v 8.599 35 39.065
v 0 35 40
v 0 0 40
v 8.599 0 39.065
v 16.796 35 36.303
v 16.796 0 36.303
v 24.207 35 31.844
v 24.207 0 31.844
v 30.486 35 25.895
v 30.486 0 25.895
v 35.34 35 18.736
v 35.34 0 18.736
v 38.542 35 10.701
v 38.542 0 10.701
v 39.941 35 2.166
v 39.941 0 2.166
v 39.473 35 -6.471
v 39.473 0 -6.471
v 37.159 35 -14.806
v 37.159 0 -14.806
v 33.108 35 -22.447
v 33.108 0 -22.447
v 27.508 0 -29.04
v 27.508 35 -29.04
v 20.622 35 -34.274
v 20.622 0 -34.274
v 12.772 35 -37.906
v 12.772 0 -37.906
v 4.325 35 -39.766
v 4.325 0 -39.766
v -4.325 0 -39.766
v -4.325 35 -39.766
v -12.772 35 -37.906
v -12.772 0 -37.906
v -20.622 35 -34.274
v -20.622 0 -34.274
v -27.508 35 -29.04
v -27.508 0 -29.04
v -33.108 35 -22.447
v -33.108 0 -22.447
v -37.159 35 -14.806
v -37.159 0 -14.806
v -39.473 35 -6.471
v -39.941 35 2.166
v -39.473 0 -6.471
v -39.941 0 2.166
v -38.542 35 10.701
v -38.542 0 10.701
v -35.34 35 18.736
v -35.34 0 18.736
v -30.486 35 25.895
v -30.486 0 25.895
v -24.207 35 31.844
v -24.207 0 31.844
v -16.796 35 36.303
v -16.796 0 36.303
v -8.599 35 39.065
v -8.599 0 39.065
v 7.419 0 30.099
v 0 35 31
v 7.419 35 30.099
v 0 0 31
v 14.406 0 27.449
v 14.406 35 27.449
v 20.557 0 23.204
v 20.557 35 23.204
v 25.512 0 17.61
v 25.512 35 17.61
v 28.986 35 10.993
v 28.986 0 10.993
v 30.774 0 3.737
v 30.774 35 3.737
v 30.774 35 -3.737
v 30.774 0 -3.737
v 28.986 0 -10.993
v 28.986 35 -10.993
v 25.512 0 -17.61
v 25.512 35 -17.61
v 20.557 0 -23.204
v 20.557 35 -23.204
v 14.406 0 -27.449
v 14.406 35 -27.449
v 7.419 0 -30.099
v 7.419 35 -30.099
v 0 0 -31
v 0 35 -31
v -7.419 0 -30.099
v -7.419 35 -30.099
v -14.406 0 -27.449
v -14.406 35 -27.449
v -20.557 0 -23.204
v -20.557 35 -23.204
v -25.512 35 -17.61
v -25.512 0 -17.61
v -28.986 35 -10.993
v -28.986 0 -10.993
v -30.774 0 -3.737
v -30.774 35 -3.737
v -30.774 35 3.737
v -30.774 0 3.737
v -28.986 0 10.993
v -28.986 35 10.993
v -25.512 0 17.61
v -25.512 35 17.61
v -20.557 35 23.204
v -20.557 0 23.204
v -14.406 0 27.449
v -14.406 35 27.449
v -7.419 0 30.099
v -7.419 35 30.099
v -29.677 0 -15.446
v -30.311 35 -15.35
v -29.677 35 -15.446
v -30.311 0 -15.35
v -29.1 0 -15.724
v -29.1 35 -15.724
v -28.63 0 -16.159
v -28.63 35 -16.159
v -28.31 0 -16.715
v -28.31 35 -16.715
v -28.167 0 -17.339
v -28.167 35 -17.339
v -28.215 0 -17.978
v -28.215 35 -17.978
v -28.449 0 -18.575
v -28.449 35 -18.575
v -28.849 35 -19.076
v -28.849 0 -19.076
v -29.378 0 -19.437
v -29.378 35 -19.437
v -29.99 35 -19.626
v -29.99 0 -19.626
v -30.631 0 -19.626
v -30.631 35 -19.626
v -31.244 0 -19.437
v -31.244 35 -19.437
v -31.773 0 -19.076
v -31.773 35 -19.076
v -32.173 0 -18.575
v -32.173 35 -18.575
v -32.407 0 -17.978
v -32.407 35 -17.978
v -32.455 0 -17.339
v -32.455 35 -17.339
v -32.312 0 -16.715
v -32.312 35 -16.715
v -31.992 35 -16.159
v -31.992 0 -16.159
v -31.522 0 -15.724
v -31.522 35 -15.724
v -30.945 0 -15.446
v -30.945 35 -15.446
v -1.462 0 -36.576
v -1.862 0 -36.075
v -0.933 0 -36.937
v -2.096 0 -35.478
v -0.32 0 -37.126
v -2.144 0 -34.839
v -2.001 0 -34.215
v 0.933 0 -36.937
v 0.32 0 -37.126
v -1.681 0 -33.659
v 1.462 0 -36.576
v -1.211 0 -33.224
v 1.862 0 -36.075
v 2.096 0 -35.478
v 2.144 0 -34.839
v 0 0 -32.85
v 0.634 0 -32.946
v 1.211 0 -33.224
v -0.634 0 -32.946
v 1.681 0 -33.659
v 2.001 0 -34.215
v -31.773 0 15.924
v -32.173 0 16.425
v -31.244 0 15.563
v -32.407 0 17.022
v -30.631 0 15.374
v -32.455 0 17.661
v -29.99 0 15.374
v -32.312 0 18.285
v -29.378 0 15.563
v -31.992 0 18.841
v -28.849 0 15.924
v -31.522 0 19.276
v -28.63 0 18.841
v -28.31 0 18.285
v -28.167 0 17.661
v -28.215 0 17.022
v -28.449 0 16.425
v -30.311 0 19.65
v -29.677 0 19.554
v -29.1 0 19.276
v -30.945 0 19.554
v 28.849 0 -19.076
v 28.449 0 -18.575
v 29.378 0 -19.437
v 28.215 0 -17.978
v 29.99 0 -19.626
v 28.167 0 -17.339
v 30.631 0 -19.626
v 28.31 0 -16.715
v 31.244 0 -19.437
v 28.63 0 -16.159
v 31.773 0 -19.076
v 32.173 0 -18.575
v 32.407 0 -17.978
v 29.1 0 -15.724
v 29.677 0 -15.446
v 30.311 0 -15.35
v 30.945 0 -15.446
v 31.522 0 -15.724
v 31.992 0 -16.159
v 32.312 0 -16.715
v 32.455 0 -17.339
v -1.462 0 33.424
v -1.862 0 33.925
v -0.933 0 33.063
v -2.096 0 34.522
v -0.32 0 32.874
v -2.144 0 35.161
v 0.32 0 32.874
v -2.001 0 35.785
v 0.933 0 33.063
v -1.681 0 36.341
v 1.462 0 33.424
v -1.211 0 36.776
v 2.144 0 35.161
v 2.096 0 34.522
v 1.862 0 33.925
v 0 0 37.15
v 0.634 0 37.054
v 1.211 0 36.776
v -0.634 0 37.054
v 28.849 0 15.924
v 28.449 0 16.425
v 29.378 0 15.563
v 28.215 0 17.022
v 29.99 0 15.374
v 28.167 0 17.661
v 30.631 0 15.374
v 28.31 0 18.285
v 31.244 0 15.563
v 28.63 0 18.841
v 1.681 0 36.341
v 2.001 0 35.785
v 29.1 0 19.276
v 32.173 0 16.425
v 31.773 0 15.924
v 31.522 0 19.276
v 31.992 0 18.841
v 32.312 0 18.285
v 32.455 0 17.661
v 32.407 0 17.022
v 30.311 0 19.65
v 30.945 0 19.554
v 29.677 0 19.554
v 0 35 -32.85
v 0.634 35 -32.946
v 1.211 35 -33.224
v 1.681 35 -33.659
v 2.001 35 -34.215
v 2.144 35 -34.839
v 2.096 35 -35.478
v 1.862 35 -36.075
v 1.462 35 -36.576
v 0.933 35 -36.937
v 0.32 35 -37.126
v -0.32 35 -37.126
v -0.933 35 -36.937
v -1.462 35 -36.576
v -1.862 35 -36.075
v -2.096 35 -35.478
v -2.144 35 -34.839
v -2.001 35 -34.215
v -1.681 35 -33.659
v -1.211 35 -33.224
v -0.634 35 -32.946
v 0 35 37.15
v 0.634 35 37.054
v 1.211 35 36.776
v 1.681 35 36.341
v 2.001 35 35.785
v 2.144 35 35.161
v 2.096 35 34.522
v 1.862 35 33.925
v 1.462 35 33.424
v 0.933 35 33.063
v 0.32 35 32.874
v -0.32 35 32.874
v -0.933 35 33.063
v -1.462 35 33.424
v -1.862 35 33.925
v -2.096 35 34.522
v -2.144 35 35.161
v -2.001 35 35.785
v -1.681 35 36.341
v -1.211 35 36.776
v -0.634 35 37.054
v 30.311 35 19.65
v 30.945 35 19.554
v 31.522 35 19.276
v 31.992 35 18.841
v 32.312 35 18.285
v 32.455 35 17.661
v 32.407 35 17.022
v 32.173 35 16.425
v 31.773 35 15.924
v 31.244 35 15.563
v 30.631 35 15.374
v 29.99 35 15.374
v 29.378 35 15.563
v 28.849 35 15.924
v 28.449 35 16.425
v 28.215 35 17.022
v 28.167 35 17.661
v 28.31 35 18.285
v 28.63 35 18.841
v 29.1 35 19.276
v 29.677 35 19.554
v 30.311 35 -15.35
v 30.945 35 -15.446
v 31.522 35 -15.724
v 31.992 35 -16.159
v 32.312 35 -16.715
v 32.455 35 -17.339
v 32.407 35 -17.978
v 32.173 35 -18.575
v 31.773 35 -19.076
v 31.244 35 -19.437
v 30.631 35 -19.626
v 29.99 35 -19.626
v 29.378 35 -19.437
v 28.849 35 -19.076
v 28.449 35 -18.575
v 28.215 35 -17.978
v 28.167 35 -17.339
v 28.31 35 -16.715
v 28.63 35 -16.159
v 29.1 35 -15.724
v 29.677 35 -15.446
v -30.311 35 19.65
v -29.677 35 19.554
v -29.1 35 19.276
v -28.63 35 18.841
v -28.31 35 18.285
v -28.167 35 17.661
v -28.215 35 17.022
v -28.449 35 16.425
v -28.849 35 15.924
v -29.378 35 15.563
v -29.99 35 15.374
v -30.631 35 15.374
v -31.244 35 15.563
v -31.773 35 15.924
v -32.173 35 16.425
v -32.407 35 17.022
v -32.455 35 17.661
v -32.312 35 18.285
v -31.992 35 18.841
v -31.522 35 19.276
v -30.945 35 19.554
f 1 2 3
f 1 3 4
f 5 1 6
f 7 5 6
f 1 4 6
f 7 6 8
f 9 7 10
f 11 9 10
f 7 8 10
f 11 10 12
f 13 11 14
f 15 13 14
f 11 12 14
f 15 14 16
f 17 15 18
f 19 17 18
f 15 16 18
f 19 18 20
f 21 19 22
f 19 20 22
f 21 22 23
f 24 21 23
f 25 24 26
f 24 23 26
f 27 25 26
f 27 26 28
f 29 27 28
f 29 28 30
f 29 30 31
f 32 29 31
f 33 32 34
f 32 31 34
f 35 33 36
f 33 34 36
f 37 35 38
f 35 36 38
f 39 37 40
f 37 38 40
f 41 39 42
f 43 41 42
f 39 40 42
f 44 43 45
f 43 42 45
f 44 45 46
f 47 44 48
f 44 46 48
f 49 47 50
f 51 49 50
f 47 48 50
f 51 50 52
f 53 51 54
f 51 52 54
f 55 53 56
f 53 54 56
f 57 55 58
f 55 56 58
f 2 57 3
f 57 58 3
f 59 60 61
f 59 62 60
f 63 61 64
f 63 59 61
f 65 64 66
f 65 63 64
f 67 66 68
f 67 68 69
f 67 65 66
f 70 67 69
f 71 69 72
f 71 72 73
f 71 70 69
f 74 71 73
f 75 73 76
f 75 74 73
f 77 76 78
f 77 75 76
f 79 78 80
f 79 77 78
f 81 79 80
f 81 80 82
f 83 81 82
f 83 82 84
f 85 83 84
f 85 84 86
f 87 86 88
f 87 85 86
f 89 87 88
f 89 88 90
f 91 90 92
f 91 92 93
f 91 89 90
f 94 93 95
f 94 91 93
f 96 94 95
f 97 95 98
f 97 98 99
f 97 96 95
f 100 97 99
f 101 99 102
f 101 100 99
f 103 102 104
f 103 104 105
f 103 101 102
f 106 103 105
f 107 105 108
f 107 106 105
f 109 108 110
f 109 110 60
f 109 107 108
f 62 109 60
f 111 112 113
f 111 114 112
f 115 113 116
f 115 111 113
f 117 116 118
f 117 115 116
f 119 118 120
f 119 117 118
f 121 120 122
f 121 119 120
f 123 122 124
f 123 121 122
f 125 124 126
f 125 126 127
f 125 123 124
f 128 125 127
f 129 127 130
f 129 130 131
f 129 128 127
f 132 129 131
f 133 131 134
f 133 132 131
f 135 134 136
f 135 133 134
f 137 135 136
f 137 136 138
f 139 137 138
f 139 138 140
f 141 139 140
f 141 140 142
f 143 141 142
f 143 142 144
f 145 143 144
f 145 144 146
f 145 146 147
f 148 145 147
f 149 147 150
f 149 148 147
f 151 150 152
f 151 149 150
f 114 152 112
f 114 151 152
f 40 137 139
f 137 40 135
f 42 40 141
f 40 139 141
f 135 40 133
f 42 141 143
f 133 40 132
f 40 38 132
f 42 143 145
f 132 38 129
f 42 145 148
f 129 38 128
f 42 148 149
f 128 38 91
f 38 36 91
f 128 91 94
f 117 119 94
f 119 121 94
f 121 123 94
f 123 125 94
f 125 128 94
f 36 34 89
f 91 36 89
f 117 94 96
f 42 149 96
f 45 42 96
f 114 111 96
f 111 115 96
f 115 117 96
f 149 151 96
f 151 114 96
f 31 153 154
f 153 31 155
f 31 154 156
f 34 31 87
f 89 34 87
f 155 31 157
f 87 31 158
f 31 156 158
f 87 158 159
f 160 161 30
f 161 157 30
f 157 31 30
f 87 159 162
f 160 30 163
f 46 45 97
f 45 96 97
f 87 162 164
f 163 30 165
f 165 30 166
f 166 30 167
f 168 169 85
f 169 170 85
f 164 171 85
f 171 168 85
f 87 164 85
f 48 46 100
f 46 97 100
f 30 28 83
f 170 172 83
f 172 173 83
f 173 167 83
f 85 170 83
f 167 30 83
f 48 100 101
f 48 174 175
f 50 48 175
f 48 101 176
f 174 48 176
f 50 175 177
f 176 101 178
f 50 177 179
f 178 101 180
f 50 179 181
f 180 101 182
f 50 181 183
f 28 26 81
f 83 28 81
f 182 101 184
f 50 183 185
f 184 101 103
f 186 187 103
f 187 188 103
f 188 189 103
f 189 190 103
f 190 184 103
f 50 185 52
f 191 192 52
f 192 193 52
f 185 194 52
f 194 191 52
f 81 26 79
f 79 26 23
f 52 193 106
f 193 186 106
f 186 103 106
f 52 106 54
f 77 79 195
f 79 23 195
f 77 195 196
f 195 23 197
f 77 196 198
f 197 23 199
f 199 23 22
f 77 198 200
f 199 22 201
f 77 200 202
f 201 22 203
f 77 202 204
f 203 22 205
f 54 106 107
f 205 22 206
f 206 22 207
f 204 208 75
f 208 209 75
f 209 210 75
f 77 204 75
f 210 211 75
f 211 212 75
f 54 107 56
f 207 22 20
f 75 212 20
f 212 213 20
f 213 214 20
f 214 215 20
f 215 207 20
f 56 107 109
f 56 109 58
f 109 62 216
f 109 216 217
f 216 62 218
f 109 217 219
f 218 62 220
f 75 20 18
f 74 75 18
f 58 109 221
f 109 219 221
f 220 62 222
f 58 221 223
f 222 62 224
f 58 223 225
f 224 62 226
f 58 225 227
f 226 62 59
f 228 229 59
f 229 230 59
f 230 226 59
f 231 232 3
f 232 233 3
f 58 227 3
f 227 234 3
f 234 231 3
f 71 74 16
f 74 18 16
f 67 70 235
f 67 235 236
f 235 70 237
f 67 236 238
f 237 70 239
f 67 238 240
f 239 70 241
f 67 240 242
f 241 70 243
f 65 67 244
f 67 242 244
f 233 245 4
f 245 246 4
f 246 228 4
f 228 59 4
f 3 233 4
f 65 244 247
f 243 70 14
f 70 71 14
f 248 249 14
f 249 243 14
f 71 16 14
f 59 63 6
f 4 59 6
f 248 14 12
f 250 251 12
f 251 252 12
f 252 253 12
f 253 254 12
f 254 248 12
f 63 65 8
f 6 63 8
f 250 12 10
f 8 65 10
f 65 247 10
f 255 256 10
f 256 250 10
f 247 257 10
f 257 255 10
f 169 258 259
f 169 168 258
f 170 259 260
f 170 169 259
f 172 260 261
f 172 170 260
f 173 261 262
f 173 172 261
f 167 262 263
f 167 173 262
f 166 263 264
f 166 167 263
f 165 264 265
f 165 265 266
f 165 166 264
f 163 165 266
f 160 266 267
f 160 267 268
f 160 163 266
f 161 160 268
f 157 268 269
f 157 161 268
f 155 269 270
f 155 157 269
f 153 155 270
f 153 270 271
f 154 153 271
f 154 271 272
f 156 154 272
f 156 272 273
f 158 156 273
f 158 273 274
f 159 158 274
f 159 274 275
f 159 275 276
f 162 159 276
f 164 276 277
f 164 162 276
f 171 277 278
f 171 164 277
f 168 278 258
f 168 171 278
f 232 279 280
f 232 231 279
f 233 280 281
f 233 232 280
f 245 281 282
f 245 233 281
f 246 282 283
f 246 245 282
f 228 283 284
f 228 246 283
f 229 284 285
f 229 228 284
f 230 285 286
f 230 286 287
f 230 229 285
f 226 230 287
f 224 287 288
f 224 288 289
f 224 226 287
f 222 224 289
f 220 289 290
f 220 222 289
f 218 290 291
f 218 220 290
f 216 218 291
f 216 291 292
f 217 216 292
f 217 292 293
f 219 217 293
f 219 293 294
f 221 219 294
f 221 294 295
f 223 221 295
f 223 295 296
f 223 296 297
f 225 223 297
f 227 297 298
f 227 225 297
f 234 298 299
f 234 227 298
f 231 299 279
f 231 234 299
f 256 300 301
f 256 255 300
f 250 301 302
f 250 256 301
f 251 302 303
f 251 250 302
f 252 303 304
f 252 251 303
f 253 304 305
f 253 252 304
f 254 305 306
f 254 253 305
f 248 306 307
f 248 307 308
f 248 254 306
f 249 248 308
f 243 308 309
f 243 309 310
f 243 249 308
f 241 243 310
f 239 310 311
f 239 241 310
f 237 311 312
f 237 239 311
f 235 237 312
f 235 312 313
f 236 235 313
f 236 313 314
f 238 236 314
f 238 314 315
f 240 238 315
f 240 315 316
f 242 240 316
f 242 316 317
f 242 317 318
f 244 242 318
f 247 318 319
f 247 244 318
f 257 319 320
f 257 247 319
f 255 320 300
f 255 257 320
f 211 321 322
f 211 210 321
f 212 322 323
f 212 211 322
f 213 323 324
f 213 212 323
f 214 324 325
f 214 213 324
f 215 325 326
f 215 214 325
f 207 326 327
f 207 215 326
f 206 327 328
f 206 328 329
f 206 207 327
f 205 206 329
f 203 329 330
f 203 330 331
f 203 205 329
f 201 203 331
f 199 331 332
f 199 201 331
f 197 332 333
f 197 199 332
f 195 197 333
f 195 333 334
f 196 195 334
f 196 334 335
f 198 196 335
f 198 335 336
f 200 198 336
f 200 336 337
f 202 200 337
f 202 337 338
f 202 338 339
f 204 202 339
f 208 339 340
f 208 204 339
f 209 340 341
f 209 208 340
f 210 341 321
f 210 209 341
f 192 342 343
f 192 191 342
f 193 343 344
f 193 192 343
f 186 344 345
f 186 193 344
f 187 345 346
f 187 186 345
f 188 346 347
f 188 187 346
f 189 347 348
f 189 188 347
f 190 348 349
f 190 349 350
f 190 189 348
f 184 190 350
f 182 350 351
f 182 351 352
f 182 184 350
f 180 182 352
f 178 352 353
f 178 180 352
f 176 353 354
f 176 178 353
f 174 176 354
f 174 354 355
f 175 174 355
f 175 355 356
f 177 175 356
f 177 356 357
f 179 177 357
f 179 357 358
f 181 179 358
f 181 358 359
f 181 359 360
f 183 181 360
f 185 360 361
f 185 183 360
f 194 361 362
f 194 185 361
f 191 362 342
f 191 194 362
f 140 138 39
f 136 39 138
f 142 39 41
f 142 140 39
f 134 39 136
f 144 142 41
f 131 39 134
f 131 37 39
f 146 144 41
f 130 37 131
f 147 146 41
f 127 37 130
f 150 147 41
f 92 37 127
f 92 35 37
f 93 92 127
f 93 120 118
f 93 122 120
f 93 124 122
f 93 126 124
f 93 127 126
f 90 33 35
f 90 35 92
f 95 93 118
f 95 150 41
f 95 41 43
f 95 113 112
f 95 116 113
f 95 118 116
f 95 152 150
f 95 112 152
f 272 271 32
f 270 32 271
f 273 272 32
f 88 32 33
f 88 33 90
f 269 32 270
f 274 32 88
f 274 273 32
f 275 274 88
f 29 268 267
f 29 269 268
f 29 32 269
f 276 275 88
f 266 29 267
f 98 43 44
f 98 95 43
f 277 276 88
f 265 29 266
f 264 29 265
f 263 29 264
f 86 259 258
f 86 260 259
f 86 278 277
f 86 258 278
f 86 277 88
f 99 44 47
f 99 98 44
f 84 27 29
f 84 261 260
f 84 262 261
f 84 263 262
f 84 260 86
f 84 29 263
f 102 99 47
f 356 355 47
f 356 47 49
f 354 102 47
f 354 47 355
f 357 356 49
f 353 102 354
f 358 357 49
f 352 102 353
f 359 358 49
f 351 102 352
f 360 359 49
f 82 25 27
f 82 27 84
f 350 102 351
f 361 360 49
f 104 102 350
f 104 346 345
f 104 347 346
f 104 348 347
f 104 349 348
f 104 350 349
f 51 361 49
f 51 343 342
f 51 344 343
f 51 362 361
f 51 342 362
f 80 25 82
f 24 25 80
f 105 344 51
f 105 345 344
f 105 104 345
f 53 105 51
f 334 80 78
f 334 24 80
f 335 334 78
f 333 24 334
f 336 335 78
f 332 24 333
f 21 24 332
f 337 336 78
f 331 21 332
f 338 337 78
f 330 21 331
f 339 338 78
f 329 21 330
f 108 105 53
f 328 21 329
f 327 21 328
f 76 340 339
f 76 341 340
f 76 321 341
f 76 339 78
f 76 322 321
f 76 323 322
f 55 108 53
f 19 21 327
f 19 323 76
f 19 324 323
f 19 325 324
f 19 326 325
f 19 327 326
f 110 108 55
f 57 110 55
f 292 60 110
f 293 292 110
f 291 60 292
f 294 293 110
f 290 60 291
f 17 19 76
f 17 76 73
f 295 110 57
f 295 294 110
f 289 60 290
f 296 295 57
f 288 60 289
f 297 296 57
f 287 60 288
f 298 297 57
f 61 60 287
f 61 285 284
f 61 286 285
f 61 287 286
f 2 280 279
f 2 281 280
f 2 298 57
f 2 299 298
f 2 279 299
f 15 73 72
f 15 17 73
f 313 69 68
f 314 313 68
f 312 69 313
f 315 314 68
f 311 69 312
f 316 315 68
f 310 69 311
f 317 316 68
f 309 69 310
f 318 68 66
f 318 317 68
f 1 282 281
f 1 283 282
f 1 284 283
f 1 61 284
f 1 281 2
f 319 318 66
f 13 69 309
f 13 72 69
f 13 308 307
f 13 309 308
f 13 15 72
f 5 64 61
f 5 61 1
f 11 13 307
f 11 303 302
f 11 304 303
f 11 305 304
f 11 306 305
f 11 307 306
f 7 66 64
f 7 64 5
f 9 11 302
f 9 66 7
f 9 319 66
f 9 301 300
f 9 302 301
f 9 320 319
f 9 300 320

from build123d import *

# Parameters (mm, degrees)
SKETCH_1_R      = 40
SKETCH_1_R_2    = 31
SKETCH_1_R_3    = 2.15
EXTRUDE_3_DEPTH = 15
SKETCH_2_R      = 40
SKETCH_2_R_2    = 31
SKETCH_2_R_3    = 2.15
EXTRUDE_5_DEPTH = 20


with BuildPart() as part:
    # 草图1 → 凸台-拉伸3 (new body)
    with BuildSketch(Plane(origin=(0, 0, 0), x_dir=(1, 0, 0), z_dir=(0, 1, 0))):
        with Locations(Location((0, 0, 0), (0, 0, 270))):
            Circle(SKETCH_1_R)
        with Locations(Location((0, 0, 0), (0, 0, 270))):
            Circle(SKETCH_1_R_2, mode=Mode.SUBTRACT)
        with Locations(Location((0, 35, 0), (0, 0, 270))):
            Circle(SKETCH_1_R_3, mode=Mode.SUBTRACT)
        with Locations(Location((30.310889132, 17.5, 0), (0, 0, 270))):
            Circle(SKETCH_1_R_3, mode=Mode.SUBTRACT)
        with Locations(Location((30.310889132, -17.5, 0), (0, 0, 270))):
            Circle(SKETCH_1_R_3, mode=Mode.SUBTRACT)
        with Locations(Location((0, -35, 0), (0, 0, 270))):
            Circle(SKETCH_1_R_3, mode=Mode.SUBTRACT)
        with Locations(Location((-30.310889132, -17.5, 0), (0, 0, 270))):
            Circle(SKETCH_1_R_3, mode=Mode.SUBTRACT)
        with Locations(Location((-30.310889132, 17.5, 0), (0, 0, 270))):
            Circle(SKETCH_1_R_3, mode=Mode.SUBTRACT)
    extrude(amount=EXTRUDE_3_DEPTH)

    # 草图2 → 凸台-拉伸5 (add)
    with BuildSketch(Plane(origin=(0, 15, 0), x_dir=(1, 0, 0), z_dir=(0, 1, 0))):
        with Locations(Location((0, 0, 0), (0, 0, 270))):
            Circle(SKETCH_2_R)
        with Locations(Location((0, 0, 0), (0, 0, 270))):
            Circle(SKETCH_2_R_2, mode=Mode.SUBTRACT)
        with Locations(Location((0, 35, 0), (0, 0, 270))):
            Circle(SKETCH_2_R_3, mode=Mode.SUBTRACT)
        with Locations(Location((30.310889132, 17.5, 0), (0, 0, 270))):
            Circle(SKETCH_2_R_3, mode=Mode.SUBTRACT)
        with Locations(Location((30.310889132, -17.5, 0), (0, 0, 270))):
            Circle(SKETCH_2_R_3, mode=Mode.SUBTRACT)
        with Locations(Location((0, -35, 0), (0, 0, 270))):
            Circle(SKETCH_2_R_3, mode=Mode.SUBTRACT)
        with Locations(Location((-30.310889132, -17.5, 0), (0, 0, 270))):
            Circle(SKETCH_2_R_3, mode=Mode.SUBTRACT)
        with Locations(Location((-30.310889132, 17.5, 0), (0, 0, 270))):
            Circle(SKETCH_2_R_3, mode=Mode.SUBTRACT)
    extrude(amount=EXTRUDE_5_DEPTH)


solid = part.part
